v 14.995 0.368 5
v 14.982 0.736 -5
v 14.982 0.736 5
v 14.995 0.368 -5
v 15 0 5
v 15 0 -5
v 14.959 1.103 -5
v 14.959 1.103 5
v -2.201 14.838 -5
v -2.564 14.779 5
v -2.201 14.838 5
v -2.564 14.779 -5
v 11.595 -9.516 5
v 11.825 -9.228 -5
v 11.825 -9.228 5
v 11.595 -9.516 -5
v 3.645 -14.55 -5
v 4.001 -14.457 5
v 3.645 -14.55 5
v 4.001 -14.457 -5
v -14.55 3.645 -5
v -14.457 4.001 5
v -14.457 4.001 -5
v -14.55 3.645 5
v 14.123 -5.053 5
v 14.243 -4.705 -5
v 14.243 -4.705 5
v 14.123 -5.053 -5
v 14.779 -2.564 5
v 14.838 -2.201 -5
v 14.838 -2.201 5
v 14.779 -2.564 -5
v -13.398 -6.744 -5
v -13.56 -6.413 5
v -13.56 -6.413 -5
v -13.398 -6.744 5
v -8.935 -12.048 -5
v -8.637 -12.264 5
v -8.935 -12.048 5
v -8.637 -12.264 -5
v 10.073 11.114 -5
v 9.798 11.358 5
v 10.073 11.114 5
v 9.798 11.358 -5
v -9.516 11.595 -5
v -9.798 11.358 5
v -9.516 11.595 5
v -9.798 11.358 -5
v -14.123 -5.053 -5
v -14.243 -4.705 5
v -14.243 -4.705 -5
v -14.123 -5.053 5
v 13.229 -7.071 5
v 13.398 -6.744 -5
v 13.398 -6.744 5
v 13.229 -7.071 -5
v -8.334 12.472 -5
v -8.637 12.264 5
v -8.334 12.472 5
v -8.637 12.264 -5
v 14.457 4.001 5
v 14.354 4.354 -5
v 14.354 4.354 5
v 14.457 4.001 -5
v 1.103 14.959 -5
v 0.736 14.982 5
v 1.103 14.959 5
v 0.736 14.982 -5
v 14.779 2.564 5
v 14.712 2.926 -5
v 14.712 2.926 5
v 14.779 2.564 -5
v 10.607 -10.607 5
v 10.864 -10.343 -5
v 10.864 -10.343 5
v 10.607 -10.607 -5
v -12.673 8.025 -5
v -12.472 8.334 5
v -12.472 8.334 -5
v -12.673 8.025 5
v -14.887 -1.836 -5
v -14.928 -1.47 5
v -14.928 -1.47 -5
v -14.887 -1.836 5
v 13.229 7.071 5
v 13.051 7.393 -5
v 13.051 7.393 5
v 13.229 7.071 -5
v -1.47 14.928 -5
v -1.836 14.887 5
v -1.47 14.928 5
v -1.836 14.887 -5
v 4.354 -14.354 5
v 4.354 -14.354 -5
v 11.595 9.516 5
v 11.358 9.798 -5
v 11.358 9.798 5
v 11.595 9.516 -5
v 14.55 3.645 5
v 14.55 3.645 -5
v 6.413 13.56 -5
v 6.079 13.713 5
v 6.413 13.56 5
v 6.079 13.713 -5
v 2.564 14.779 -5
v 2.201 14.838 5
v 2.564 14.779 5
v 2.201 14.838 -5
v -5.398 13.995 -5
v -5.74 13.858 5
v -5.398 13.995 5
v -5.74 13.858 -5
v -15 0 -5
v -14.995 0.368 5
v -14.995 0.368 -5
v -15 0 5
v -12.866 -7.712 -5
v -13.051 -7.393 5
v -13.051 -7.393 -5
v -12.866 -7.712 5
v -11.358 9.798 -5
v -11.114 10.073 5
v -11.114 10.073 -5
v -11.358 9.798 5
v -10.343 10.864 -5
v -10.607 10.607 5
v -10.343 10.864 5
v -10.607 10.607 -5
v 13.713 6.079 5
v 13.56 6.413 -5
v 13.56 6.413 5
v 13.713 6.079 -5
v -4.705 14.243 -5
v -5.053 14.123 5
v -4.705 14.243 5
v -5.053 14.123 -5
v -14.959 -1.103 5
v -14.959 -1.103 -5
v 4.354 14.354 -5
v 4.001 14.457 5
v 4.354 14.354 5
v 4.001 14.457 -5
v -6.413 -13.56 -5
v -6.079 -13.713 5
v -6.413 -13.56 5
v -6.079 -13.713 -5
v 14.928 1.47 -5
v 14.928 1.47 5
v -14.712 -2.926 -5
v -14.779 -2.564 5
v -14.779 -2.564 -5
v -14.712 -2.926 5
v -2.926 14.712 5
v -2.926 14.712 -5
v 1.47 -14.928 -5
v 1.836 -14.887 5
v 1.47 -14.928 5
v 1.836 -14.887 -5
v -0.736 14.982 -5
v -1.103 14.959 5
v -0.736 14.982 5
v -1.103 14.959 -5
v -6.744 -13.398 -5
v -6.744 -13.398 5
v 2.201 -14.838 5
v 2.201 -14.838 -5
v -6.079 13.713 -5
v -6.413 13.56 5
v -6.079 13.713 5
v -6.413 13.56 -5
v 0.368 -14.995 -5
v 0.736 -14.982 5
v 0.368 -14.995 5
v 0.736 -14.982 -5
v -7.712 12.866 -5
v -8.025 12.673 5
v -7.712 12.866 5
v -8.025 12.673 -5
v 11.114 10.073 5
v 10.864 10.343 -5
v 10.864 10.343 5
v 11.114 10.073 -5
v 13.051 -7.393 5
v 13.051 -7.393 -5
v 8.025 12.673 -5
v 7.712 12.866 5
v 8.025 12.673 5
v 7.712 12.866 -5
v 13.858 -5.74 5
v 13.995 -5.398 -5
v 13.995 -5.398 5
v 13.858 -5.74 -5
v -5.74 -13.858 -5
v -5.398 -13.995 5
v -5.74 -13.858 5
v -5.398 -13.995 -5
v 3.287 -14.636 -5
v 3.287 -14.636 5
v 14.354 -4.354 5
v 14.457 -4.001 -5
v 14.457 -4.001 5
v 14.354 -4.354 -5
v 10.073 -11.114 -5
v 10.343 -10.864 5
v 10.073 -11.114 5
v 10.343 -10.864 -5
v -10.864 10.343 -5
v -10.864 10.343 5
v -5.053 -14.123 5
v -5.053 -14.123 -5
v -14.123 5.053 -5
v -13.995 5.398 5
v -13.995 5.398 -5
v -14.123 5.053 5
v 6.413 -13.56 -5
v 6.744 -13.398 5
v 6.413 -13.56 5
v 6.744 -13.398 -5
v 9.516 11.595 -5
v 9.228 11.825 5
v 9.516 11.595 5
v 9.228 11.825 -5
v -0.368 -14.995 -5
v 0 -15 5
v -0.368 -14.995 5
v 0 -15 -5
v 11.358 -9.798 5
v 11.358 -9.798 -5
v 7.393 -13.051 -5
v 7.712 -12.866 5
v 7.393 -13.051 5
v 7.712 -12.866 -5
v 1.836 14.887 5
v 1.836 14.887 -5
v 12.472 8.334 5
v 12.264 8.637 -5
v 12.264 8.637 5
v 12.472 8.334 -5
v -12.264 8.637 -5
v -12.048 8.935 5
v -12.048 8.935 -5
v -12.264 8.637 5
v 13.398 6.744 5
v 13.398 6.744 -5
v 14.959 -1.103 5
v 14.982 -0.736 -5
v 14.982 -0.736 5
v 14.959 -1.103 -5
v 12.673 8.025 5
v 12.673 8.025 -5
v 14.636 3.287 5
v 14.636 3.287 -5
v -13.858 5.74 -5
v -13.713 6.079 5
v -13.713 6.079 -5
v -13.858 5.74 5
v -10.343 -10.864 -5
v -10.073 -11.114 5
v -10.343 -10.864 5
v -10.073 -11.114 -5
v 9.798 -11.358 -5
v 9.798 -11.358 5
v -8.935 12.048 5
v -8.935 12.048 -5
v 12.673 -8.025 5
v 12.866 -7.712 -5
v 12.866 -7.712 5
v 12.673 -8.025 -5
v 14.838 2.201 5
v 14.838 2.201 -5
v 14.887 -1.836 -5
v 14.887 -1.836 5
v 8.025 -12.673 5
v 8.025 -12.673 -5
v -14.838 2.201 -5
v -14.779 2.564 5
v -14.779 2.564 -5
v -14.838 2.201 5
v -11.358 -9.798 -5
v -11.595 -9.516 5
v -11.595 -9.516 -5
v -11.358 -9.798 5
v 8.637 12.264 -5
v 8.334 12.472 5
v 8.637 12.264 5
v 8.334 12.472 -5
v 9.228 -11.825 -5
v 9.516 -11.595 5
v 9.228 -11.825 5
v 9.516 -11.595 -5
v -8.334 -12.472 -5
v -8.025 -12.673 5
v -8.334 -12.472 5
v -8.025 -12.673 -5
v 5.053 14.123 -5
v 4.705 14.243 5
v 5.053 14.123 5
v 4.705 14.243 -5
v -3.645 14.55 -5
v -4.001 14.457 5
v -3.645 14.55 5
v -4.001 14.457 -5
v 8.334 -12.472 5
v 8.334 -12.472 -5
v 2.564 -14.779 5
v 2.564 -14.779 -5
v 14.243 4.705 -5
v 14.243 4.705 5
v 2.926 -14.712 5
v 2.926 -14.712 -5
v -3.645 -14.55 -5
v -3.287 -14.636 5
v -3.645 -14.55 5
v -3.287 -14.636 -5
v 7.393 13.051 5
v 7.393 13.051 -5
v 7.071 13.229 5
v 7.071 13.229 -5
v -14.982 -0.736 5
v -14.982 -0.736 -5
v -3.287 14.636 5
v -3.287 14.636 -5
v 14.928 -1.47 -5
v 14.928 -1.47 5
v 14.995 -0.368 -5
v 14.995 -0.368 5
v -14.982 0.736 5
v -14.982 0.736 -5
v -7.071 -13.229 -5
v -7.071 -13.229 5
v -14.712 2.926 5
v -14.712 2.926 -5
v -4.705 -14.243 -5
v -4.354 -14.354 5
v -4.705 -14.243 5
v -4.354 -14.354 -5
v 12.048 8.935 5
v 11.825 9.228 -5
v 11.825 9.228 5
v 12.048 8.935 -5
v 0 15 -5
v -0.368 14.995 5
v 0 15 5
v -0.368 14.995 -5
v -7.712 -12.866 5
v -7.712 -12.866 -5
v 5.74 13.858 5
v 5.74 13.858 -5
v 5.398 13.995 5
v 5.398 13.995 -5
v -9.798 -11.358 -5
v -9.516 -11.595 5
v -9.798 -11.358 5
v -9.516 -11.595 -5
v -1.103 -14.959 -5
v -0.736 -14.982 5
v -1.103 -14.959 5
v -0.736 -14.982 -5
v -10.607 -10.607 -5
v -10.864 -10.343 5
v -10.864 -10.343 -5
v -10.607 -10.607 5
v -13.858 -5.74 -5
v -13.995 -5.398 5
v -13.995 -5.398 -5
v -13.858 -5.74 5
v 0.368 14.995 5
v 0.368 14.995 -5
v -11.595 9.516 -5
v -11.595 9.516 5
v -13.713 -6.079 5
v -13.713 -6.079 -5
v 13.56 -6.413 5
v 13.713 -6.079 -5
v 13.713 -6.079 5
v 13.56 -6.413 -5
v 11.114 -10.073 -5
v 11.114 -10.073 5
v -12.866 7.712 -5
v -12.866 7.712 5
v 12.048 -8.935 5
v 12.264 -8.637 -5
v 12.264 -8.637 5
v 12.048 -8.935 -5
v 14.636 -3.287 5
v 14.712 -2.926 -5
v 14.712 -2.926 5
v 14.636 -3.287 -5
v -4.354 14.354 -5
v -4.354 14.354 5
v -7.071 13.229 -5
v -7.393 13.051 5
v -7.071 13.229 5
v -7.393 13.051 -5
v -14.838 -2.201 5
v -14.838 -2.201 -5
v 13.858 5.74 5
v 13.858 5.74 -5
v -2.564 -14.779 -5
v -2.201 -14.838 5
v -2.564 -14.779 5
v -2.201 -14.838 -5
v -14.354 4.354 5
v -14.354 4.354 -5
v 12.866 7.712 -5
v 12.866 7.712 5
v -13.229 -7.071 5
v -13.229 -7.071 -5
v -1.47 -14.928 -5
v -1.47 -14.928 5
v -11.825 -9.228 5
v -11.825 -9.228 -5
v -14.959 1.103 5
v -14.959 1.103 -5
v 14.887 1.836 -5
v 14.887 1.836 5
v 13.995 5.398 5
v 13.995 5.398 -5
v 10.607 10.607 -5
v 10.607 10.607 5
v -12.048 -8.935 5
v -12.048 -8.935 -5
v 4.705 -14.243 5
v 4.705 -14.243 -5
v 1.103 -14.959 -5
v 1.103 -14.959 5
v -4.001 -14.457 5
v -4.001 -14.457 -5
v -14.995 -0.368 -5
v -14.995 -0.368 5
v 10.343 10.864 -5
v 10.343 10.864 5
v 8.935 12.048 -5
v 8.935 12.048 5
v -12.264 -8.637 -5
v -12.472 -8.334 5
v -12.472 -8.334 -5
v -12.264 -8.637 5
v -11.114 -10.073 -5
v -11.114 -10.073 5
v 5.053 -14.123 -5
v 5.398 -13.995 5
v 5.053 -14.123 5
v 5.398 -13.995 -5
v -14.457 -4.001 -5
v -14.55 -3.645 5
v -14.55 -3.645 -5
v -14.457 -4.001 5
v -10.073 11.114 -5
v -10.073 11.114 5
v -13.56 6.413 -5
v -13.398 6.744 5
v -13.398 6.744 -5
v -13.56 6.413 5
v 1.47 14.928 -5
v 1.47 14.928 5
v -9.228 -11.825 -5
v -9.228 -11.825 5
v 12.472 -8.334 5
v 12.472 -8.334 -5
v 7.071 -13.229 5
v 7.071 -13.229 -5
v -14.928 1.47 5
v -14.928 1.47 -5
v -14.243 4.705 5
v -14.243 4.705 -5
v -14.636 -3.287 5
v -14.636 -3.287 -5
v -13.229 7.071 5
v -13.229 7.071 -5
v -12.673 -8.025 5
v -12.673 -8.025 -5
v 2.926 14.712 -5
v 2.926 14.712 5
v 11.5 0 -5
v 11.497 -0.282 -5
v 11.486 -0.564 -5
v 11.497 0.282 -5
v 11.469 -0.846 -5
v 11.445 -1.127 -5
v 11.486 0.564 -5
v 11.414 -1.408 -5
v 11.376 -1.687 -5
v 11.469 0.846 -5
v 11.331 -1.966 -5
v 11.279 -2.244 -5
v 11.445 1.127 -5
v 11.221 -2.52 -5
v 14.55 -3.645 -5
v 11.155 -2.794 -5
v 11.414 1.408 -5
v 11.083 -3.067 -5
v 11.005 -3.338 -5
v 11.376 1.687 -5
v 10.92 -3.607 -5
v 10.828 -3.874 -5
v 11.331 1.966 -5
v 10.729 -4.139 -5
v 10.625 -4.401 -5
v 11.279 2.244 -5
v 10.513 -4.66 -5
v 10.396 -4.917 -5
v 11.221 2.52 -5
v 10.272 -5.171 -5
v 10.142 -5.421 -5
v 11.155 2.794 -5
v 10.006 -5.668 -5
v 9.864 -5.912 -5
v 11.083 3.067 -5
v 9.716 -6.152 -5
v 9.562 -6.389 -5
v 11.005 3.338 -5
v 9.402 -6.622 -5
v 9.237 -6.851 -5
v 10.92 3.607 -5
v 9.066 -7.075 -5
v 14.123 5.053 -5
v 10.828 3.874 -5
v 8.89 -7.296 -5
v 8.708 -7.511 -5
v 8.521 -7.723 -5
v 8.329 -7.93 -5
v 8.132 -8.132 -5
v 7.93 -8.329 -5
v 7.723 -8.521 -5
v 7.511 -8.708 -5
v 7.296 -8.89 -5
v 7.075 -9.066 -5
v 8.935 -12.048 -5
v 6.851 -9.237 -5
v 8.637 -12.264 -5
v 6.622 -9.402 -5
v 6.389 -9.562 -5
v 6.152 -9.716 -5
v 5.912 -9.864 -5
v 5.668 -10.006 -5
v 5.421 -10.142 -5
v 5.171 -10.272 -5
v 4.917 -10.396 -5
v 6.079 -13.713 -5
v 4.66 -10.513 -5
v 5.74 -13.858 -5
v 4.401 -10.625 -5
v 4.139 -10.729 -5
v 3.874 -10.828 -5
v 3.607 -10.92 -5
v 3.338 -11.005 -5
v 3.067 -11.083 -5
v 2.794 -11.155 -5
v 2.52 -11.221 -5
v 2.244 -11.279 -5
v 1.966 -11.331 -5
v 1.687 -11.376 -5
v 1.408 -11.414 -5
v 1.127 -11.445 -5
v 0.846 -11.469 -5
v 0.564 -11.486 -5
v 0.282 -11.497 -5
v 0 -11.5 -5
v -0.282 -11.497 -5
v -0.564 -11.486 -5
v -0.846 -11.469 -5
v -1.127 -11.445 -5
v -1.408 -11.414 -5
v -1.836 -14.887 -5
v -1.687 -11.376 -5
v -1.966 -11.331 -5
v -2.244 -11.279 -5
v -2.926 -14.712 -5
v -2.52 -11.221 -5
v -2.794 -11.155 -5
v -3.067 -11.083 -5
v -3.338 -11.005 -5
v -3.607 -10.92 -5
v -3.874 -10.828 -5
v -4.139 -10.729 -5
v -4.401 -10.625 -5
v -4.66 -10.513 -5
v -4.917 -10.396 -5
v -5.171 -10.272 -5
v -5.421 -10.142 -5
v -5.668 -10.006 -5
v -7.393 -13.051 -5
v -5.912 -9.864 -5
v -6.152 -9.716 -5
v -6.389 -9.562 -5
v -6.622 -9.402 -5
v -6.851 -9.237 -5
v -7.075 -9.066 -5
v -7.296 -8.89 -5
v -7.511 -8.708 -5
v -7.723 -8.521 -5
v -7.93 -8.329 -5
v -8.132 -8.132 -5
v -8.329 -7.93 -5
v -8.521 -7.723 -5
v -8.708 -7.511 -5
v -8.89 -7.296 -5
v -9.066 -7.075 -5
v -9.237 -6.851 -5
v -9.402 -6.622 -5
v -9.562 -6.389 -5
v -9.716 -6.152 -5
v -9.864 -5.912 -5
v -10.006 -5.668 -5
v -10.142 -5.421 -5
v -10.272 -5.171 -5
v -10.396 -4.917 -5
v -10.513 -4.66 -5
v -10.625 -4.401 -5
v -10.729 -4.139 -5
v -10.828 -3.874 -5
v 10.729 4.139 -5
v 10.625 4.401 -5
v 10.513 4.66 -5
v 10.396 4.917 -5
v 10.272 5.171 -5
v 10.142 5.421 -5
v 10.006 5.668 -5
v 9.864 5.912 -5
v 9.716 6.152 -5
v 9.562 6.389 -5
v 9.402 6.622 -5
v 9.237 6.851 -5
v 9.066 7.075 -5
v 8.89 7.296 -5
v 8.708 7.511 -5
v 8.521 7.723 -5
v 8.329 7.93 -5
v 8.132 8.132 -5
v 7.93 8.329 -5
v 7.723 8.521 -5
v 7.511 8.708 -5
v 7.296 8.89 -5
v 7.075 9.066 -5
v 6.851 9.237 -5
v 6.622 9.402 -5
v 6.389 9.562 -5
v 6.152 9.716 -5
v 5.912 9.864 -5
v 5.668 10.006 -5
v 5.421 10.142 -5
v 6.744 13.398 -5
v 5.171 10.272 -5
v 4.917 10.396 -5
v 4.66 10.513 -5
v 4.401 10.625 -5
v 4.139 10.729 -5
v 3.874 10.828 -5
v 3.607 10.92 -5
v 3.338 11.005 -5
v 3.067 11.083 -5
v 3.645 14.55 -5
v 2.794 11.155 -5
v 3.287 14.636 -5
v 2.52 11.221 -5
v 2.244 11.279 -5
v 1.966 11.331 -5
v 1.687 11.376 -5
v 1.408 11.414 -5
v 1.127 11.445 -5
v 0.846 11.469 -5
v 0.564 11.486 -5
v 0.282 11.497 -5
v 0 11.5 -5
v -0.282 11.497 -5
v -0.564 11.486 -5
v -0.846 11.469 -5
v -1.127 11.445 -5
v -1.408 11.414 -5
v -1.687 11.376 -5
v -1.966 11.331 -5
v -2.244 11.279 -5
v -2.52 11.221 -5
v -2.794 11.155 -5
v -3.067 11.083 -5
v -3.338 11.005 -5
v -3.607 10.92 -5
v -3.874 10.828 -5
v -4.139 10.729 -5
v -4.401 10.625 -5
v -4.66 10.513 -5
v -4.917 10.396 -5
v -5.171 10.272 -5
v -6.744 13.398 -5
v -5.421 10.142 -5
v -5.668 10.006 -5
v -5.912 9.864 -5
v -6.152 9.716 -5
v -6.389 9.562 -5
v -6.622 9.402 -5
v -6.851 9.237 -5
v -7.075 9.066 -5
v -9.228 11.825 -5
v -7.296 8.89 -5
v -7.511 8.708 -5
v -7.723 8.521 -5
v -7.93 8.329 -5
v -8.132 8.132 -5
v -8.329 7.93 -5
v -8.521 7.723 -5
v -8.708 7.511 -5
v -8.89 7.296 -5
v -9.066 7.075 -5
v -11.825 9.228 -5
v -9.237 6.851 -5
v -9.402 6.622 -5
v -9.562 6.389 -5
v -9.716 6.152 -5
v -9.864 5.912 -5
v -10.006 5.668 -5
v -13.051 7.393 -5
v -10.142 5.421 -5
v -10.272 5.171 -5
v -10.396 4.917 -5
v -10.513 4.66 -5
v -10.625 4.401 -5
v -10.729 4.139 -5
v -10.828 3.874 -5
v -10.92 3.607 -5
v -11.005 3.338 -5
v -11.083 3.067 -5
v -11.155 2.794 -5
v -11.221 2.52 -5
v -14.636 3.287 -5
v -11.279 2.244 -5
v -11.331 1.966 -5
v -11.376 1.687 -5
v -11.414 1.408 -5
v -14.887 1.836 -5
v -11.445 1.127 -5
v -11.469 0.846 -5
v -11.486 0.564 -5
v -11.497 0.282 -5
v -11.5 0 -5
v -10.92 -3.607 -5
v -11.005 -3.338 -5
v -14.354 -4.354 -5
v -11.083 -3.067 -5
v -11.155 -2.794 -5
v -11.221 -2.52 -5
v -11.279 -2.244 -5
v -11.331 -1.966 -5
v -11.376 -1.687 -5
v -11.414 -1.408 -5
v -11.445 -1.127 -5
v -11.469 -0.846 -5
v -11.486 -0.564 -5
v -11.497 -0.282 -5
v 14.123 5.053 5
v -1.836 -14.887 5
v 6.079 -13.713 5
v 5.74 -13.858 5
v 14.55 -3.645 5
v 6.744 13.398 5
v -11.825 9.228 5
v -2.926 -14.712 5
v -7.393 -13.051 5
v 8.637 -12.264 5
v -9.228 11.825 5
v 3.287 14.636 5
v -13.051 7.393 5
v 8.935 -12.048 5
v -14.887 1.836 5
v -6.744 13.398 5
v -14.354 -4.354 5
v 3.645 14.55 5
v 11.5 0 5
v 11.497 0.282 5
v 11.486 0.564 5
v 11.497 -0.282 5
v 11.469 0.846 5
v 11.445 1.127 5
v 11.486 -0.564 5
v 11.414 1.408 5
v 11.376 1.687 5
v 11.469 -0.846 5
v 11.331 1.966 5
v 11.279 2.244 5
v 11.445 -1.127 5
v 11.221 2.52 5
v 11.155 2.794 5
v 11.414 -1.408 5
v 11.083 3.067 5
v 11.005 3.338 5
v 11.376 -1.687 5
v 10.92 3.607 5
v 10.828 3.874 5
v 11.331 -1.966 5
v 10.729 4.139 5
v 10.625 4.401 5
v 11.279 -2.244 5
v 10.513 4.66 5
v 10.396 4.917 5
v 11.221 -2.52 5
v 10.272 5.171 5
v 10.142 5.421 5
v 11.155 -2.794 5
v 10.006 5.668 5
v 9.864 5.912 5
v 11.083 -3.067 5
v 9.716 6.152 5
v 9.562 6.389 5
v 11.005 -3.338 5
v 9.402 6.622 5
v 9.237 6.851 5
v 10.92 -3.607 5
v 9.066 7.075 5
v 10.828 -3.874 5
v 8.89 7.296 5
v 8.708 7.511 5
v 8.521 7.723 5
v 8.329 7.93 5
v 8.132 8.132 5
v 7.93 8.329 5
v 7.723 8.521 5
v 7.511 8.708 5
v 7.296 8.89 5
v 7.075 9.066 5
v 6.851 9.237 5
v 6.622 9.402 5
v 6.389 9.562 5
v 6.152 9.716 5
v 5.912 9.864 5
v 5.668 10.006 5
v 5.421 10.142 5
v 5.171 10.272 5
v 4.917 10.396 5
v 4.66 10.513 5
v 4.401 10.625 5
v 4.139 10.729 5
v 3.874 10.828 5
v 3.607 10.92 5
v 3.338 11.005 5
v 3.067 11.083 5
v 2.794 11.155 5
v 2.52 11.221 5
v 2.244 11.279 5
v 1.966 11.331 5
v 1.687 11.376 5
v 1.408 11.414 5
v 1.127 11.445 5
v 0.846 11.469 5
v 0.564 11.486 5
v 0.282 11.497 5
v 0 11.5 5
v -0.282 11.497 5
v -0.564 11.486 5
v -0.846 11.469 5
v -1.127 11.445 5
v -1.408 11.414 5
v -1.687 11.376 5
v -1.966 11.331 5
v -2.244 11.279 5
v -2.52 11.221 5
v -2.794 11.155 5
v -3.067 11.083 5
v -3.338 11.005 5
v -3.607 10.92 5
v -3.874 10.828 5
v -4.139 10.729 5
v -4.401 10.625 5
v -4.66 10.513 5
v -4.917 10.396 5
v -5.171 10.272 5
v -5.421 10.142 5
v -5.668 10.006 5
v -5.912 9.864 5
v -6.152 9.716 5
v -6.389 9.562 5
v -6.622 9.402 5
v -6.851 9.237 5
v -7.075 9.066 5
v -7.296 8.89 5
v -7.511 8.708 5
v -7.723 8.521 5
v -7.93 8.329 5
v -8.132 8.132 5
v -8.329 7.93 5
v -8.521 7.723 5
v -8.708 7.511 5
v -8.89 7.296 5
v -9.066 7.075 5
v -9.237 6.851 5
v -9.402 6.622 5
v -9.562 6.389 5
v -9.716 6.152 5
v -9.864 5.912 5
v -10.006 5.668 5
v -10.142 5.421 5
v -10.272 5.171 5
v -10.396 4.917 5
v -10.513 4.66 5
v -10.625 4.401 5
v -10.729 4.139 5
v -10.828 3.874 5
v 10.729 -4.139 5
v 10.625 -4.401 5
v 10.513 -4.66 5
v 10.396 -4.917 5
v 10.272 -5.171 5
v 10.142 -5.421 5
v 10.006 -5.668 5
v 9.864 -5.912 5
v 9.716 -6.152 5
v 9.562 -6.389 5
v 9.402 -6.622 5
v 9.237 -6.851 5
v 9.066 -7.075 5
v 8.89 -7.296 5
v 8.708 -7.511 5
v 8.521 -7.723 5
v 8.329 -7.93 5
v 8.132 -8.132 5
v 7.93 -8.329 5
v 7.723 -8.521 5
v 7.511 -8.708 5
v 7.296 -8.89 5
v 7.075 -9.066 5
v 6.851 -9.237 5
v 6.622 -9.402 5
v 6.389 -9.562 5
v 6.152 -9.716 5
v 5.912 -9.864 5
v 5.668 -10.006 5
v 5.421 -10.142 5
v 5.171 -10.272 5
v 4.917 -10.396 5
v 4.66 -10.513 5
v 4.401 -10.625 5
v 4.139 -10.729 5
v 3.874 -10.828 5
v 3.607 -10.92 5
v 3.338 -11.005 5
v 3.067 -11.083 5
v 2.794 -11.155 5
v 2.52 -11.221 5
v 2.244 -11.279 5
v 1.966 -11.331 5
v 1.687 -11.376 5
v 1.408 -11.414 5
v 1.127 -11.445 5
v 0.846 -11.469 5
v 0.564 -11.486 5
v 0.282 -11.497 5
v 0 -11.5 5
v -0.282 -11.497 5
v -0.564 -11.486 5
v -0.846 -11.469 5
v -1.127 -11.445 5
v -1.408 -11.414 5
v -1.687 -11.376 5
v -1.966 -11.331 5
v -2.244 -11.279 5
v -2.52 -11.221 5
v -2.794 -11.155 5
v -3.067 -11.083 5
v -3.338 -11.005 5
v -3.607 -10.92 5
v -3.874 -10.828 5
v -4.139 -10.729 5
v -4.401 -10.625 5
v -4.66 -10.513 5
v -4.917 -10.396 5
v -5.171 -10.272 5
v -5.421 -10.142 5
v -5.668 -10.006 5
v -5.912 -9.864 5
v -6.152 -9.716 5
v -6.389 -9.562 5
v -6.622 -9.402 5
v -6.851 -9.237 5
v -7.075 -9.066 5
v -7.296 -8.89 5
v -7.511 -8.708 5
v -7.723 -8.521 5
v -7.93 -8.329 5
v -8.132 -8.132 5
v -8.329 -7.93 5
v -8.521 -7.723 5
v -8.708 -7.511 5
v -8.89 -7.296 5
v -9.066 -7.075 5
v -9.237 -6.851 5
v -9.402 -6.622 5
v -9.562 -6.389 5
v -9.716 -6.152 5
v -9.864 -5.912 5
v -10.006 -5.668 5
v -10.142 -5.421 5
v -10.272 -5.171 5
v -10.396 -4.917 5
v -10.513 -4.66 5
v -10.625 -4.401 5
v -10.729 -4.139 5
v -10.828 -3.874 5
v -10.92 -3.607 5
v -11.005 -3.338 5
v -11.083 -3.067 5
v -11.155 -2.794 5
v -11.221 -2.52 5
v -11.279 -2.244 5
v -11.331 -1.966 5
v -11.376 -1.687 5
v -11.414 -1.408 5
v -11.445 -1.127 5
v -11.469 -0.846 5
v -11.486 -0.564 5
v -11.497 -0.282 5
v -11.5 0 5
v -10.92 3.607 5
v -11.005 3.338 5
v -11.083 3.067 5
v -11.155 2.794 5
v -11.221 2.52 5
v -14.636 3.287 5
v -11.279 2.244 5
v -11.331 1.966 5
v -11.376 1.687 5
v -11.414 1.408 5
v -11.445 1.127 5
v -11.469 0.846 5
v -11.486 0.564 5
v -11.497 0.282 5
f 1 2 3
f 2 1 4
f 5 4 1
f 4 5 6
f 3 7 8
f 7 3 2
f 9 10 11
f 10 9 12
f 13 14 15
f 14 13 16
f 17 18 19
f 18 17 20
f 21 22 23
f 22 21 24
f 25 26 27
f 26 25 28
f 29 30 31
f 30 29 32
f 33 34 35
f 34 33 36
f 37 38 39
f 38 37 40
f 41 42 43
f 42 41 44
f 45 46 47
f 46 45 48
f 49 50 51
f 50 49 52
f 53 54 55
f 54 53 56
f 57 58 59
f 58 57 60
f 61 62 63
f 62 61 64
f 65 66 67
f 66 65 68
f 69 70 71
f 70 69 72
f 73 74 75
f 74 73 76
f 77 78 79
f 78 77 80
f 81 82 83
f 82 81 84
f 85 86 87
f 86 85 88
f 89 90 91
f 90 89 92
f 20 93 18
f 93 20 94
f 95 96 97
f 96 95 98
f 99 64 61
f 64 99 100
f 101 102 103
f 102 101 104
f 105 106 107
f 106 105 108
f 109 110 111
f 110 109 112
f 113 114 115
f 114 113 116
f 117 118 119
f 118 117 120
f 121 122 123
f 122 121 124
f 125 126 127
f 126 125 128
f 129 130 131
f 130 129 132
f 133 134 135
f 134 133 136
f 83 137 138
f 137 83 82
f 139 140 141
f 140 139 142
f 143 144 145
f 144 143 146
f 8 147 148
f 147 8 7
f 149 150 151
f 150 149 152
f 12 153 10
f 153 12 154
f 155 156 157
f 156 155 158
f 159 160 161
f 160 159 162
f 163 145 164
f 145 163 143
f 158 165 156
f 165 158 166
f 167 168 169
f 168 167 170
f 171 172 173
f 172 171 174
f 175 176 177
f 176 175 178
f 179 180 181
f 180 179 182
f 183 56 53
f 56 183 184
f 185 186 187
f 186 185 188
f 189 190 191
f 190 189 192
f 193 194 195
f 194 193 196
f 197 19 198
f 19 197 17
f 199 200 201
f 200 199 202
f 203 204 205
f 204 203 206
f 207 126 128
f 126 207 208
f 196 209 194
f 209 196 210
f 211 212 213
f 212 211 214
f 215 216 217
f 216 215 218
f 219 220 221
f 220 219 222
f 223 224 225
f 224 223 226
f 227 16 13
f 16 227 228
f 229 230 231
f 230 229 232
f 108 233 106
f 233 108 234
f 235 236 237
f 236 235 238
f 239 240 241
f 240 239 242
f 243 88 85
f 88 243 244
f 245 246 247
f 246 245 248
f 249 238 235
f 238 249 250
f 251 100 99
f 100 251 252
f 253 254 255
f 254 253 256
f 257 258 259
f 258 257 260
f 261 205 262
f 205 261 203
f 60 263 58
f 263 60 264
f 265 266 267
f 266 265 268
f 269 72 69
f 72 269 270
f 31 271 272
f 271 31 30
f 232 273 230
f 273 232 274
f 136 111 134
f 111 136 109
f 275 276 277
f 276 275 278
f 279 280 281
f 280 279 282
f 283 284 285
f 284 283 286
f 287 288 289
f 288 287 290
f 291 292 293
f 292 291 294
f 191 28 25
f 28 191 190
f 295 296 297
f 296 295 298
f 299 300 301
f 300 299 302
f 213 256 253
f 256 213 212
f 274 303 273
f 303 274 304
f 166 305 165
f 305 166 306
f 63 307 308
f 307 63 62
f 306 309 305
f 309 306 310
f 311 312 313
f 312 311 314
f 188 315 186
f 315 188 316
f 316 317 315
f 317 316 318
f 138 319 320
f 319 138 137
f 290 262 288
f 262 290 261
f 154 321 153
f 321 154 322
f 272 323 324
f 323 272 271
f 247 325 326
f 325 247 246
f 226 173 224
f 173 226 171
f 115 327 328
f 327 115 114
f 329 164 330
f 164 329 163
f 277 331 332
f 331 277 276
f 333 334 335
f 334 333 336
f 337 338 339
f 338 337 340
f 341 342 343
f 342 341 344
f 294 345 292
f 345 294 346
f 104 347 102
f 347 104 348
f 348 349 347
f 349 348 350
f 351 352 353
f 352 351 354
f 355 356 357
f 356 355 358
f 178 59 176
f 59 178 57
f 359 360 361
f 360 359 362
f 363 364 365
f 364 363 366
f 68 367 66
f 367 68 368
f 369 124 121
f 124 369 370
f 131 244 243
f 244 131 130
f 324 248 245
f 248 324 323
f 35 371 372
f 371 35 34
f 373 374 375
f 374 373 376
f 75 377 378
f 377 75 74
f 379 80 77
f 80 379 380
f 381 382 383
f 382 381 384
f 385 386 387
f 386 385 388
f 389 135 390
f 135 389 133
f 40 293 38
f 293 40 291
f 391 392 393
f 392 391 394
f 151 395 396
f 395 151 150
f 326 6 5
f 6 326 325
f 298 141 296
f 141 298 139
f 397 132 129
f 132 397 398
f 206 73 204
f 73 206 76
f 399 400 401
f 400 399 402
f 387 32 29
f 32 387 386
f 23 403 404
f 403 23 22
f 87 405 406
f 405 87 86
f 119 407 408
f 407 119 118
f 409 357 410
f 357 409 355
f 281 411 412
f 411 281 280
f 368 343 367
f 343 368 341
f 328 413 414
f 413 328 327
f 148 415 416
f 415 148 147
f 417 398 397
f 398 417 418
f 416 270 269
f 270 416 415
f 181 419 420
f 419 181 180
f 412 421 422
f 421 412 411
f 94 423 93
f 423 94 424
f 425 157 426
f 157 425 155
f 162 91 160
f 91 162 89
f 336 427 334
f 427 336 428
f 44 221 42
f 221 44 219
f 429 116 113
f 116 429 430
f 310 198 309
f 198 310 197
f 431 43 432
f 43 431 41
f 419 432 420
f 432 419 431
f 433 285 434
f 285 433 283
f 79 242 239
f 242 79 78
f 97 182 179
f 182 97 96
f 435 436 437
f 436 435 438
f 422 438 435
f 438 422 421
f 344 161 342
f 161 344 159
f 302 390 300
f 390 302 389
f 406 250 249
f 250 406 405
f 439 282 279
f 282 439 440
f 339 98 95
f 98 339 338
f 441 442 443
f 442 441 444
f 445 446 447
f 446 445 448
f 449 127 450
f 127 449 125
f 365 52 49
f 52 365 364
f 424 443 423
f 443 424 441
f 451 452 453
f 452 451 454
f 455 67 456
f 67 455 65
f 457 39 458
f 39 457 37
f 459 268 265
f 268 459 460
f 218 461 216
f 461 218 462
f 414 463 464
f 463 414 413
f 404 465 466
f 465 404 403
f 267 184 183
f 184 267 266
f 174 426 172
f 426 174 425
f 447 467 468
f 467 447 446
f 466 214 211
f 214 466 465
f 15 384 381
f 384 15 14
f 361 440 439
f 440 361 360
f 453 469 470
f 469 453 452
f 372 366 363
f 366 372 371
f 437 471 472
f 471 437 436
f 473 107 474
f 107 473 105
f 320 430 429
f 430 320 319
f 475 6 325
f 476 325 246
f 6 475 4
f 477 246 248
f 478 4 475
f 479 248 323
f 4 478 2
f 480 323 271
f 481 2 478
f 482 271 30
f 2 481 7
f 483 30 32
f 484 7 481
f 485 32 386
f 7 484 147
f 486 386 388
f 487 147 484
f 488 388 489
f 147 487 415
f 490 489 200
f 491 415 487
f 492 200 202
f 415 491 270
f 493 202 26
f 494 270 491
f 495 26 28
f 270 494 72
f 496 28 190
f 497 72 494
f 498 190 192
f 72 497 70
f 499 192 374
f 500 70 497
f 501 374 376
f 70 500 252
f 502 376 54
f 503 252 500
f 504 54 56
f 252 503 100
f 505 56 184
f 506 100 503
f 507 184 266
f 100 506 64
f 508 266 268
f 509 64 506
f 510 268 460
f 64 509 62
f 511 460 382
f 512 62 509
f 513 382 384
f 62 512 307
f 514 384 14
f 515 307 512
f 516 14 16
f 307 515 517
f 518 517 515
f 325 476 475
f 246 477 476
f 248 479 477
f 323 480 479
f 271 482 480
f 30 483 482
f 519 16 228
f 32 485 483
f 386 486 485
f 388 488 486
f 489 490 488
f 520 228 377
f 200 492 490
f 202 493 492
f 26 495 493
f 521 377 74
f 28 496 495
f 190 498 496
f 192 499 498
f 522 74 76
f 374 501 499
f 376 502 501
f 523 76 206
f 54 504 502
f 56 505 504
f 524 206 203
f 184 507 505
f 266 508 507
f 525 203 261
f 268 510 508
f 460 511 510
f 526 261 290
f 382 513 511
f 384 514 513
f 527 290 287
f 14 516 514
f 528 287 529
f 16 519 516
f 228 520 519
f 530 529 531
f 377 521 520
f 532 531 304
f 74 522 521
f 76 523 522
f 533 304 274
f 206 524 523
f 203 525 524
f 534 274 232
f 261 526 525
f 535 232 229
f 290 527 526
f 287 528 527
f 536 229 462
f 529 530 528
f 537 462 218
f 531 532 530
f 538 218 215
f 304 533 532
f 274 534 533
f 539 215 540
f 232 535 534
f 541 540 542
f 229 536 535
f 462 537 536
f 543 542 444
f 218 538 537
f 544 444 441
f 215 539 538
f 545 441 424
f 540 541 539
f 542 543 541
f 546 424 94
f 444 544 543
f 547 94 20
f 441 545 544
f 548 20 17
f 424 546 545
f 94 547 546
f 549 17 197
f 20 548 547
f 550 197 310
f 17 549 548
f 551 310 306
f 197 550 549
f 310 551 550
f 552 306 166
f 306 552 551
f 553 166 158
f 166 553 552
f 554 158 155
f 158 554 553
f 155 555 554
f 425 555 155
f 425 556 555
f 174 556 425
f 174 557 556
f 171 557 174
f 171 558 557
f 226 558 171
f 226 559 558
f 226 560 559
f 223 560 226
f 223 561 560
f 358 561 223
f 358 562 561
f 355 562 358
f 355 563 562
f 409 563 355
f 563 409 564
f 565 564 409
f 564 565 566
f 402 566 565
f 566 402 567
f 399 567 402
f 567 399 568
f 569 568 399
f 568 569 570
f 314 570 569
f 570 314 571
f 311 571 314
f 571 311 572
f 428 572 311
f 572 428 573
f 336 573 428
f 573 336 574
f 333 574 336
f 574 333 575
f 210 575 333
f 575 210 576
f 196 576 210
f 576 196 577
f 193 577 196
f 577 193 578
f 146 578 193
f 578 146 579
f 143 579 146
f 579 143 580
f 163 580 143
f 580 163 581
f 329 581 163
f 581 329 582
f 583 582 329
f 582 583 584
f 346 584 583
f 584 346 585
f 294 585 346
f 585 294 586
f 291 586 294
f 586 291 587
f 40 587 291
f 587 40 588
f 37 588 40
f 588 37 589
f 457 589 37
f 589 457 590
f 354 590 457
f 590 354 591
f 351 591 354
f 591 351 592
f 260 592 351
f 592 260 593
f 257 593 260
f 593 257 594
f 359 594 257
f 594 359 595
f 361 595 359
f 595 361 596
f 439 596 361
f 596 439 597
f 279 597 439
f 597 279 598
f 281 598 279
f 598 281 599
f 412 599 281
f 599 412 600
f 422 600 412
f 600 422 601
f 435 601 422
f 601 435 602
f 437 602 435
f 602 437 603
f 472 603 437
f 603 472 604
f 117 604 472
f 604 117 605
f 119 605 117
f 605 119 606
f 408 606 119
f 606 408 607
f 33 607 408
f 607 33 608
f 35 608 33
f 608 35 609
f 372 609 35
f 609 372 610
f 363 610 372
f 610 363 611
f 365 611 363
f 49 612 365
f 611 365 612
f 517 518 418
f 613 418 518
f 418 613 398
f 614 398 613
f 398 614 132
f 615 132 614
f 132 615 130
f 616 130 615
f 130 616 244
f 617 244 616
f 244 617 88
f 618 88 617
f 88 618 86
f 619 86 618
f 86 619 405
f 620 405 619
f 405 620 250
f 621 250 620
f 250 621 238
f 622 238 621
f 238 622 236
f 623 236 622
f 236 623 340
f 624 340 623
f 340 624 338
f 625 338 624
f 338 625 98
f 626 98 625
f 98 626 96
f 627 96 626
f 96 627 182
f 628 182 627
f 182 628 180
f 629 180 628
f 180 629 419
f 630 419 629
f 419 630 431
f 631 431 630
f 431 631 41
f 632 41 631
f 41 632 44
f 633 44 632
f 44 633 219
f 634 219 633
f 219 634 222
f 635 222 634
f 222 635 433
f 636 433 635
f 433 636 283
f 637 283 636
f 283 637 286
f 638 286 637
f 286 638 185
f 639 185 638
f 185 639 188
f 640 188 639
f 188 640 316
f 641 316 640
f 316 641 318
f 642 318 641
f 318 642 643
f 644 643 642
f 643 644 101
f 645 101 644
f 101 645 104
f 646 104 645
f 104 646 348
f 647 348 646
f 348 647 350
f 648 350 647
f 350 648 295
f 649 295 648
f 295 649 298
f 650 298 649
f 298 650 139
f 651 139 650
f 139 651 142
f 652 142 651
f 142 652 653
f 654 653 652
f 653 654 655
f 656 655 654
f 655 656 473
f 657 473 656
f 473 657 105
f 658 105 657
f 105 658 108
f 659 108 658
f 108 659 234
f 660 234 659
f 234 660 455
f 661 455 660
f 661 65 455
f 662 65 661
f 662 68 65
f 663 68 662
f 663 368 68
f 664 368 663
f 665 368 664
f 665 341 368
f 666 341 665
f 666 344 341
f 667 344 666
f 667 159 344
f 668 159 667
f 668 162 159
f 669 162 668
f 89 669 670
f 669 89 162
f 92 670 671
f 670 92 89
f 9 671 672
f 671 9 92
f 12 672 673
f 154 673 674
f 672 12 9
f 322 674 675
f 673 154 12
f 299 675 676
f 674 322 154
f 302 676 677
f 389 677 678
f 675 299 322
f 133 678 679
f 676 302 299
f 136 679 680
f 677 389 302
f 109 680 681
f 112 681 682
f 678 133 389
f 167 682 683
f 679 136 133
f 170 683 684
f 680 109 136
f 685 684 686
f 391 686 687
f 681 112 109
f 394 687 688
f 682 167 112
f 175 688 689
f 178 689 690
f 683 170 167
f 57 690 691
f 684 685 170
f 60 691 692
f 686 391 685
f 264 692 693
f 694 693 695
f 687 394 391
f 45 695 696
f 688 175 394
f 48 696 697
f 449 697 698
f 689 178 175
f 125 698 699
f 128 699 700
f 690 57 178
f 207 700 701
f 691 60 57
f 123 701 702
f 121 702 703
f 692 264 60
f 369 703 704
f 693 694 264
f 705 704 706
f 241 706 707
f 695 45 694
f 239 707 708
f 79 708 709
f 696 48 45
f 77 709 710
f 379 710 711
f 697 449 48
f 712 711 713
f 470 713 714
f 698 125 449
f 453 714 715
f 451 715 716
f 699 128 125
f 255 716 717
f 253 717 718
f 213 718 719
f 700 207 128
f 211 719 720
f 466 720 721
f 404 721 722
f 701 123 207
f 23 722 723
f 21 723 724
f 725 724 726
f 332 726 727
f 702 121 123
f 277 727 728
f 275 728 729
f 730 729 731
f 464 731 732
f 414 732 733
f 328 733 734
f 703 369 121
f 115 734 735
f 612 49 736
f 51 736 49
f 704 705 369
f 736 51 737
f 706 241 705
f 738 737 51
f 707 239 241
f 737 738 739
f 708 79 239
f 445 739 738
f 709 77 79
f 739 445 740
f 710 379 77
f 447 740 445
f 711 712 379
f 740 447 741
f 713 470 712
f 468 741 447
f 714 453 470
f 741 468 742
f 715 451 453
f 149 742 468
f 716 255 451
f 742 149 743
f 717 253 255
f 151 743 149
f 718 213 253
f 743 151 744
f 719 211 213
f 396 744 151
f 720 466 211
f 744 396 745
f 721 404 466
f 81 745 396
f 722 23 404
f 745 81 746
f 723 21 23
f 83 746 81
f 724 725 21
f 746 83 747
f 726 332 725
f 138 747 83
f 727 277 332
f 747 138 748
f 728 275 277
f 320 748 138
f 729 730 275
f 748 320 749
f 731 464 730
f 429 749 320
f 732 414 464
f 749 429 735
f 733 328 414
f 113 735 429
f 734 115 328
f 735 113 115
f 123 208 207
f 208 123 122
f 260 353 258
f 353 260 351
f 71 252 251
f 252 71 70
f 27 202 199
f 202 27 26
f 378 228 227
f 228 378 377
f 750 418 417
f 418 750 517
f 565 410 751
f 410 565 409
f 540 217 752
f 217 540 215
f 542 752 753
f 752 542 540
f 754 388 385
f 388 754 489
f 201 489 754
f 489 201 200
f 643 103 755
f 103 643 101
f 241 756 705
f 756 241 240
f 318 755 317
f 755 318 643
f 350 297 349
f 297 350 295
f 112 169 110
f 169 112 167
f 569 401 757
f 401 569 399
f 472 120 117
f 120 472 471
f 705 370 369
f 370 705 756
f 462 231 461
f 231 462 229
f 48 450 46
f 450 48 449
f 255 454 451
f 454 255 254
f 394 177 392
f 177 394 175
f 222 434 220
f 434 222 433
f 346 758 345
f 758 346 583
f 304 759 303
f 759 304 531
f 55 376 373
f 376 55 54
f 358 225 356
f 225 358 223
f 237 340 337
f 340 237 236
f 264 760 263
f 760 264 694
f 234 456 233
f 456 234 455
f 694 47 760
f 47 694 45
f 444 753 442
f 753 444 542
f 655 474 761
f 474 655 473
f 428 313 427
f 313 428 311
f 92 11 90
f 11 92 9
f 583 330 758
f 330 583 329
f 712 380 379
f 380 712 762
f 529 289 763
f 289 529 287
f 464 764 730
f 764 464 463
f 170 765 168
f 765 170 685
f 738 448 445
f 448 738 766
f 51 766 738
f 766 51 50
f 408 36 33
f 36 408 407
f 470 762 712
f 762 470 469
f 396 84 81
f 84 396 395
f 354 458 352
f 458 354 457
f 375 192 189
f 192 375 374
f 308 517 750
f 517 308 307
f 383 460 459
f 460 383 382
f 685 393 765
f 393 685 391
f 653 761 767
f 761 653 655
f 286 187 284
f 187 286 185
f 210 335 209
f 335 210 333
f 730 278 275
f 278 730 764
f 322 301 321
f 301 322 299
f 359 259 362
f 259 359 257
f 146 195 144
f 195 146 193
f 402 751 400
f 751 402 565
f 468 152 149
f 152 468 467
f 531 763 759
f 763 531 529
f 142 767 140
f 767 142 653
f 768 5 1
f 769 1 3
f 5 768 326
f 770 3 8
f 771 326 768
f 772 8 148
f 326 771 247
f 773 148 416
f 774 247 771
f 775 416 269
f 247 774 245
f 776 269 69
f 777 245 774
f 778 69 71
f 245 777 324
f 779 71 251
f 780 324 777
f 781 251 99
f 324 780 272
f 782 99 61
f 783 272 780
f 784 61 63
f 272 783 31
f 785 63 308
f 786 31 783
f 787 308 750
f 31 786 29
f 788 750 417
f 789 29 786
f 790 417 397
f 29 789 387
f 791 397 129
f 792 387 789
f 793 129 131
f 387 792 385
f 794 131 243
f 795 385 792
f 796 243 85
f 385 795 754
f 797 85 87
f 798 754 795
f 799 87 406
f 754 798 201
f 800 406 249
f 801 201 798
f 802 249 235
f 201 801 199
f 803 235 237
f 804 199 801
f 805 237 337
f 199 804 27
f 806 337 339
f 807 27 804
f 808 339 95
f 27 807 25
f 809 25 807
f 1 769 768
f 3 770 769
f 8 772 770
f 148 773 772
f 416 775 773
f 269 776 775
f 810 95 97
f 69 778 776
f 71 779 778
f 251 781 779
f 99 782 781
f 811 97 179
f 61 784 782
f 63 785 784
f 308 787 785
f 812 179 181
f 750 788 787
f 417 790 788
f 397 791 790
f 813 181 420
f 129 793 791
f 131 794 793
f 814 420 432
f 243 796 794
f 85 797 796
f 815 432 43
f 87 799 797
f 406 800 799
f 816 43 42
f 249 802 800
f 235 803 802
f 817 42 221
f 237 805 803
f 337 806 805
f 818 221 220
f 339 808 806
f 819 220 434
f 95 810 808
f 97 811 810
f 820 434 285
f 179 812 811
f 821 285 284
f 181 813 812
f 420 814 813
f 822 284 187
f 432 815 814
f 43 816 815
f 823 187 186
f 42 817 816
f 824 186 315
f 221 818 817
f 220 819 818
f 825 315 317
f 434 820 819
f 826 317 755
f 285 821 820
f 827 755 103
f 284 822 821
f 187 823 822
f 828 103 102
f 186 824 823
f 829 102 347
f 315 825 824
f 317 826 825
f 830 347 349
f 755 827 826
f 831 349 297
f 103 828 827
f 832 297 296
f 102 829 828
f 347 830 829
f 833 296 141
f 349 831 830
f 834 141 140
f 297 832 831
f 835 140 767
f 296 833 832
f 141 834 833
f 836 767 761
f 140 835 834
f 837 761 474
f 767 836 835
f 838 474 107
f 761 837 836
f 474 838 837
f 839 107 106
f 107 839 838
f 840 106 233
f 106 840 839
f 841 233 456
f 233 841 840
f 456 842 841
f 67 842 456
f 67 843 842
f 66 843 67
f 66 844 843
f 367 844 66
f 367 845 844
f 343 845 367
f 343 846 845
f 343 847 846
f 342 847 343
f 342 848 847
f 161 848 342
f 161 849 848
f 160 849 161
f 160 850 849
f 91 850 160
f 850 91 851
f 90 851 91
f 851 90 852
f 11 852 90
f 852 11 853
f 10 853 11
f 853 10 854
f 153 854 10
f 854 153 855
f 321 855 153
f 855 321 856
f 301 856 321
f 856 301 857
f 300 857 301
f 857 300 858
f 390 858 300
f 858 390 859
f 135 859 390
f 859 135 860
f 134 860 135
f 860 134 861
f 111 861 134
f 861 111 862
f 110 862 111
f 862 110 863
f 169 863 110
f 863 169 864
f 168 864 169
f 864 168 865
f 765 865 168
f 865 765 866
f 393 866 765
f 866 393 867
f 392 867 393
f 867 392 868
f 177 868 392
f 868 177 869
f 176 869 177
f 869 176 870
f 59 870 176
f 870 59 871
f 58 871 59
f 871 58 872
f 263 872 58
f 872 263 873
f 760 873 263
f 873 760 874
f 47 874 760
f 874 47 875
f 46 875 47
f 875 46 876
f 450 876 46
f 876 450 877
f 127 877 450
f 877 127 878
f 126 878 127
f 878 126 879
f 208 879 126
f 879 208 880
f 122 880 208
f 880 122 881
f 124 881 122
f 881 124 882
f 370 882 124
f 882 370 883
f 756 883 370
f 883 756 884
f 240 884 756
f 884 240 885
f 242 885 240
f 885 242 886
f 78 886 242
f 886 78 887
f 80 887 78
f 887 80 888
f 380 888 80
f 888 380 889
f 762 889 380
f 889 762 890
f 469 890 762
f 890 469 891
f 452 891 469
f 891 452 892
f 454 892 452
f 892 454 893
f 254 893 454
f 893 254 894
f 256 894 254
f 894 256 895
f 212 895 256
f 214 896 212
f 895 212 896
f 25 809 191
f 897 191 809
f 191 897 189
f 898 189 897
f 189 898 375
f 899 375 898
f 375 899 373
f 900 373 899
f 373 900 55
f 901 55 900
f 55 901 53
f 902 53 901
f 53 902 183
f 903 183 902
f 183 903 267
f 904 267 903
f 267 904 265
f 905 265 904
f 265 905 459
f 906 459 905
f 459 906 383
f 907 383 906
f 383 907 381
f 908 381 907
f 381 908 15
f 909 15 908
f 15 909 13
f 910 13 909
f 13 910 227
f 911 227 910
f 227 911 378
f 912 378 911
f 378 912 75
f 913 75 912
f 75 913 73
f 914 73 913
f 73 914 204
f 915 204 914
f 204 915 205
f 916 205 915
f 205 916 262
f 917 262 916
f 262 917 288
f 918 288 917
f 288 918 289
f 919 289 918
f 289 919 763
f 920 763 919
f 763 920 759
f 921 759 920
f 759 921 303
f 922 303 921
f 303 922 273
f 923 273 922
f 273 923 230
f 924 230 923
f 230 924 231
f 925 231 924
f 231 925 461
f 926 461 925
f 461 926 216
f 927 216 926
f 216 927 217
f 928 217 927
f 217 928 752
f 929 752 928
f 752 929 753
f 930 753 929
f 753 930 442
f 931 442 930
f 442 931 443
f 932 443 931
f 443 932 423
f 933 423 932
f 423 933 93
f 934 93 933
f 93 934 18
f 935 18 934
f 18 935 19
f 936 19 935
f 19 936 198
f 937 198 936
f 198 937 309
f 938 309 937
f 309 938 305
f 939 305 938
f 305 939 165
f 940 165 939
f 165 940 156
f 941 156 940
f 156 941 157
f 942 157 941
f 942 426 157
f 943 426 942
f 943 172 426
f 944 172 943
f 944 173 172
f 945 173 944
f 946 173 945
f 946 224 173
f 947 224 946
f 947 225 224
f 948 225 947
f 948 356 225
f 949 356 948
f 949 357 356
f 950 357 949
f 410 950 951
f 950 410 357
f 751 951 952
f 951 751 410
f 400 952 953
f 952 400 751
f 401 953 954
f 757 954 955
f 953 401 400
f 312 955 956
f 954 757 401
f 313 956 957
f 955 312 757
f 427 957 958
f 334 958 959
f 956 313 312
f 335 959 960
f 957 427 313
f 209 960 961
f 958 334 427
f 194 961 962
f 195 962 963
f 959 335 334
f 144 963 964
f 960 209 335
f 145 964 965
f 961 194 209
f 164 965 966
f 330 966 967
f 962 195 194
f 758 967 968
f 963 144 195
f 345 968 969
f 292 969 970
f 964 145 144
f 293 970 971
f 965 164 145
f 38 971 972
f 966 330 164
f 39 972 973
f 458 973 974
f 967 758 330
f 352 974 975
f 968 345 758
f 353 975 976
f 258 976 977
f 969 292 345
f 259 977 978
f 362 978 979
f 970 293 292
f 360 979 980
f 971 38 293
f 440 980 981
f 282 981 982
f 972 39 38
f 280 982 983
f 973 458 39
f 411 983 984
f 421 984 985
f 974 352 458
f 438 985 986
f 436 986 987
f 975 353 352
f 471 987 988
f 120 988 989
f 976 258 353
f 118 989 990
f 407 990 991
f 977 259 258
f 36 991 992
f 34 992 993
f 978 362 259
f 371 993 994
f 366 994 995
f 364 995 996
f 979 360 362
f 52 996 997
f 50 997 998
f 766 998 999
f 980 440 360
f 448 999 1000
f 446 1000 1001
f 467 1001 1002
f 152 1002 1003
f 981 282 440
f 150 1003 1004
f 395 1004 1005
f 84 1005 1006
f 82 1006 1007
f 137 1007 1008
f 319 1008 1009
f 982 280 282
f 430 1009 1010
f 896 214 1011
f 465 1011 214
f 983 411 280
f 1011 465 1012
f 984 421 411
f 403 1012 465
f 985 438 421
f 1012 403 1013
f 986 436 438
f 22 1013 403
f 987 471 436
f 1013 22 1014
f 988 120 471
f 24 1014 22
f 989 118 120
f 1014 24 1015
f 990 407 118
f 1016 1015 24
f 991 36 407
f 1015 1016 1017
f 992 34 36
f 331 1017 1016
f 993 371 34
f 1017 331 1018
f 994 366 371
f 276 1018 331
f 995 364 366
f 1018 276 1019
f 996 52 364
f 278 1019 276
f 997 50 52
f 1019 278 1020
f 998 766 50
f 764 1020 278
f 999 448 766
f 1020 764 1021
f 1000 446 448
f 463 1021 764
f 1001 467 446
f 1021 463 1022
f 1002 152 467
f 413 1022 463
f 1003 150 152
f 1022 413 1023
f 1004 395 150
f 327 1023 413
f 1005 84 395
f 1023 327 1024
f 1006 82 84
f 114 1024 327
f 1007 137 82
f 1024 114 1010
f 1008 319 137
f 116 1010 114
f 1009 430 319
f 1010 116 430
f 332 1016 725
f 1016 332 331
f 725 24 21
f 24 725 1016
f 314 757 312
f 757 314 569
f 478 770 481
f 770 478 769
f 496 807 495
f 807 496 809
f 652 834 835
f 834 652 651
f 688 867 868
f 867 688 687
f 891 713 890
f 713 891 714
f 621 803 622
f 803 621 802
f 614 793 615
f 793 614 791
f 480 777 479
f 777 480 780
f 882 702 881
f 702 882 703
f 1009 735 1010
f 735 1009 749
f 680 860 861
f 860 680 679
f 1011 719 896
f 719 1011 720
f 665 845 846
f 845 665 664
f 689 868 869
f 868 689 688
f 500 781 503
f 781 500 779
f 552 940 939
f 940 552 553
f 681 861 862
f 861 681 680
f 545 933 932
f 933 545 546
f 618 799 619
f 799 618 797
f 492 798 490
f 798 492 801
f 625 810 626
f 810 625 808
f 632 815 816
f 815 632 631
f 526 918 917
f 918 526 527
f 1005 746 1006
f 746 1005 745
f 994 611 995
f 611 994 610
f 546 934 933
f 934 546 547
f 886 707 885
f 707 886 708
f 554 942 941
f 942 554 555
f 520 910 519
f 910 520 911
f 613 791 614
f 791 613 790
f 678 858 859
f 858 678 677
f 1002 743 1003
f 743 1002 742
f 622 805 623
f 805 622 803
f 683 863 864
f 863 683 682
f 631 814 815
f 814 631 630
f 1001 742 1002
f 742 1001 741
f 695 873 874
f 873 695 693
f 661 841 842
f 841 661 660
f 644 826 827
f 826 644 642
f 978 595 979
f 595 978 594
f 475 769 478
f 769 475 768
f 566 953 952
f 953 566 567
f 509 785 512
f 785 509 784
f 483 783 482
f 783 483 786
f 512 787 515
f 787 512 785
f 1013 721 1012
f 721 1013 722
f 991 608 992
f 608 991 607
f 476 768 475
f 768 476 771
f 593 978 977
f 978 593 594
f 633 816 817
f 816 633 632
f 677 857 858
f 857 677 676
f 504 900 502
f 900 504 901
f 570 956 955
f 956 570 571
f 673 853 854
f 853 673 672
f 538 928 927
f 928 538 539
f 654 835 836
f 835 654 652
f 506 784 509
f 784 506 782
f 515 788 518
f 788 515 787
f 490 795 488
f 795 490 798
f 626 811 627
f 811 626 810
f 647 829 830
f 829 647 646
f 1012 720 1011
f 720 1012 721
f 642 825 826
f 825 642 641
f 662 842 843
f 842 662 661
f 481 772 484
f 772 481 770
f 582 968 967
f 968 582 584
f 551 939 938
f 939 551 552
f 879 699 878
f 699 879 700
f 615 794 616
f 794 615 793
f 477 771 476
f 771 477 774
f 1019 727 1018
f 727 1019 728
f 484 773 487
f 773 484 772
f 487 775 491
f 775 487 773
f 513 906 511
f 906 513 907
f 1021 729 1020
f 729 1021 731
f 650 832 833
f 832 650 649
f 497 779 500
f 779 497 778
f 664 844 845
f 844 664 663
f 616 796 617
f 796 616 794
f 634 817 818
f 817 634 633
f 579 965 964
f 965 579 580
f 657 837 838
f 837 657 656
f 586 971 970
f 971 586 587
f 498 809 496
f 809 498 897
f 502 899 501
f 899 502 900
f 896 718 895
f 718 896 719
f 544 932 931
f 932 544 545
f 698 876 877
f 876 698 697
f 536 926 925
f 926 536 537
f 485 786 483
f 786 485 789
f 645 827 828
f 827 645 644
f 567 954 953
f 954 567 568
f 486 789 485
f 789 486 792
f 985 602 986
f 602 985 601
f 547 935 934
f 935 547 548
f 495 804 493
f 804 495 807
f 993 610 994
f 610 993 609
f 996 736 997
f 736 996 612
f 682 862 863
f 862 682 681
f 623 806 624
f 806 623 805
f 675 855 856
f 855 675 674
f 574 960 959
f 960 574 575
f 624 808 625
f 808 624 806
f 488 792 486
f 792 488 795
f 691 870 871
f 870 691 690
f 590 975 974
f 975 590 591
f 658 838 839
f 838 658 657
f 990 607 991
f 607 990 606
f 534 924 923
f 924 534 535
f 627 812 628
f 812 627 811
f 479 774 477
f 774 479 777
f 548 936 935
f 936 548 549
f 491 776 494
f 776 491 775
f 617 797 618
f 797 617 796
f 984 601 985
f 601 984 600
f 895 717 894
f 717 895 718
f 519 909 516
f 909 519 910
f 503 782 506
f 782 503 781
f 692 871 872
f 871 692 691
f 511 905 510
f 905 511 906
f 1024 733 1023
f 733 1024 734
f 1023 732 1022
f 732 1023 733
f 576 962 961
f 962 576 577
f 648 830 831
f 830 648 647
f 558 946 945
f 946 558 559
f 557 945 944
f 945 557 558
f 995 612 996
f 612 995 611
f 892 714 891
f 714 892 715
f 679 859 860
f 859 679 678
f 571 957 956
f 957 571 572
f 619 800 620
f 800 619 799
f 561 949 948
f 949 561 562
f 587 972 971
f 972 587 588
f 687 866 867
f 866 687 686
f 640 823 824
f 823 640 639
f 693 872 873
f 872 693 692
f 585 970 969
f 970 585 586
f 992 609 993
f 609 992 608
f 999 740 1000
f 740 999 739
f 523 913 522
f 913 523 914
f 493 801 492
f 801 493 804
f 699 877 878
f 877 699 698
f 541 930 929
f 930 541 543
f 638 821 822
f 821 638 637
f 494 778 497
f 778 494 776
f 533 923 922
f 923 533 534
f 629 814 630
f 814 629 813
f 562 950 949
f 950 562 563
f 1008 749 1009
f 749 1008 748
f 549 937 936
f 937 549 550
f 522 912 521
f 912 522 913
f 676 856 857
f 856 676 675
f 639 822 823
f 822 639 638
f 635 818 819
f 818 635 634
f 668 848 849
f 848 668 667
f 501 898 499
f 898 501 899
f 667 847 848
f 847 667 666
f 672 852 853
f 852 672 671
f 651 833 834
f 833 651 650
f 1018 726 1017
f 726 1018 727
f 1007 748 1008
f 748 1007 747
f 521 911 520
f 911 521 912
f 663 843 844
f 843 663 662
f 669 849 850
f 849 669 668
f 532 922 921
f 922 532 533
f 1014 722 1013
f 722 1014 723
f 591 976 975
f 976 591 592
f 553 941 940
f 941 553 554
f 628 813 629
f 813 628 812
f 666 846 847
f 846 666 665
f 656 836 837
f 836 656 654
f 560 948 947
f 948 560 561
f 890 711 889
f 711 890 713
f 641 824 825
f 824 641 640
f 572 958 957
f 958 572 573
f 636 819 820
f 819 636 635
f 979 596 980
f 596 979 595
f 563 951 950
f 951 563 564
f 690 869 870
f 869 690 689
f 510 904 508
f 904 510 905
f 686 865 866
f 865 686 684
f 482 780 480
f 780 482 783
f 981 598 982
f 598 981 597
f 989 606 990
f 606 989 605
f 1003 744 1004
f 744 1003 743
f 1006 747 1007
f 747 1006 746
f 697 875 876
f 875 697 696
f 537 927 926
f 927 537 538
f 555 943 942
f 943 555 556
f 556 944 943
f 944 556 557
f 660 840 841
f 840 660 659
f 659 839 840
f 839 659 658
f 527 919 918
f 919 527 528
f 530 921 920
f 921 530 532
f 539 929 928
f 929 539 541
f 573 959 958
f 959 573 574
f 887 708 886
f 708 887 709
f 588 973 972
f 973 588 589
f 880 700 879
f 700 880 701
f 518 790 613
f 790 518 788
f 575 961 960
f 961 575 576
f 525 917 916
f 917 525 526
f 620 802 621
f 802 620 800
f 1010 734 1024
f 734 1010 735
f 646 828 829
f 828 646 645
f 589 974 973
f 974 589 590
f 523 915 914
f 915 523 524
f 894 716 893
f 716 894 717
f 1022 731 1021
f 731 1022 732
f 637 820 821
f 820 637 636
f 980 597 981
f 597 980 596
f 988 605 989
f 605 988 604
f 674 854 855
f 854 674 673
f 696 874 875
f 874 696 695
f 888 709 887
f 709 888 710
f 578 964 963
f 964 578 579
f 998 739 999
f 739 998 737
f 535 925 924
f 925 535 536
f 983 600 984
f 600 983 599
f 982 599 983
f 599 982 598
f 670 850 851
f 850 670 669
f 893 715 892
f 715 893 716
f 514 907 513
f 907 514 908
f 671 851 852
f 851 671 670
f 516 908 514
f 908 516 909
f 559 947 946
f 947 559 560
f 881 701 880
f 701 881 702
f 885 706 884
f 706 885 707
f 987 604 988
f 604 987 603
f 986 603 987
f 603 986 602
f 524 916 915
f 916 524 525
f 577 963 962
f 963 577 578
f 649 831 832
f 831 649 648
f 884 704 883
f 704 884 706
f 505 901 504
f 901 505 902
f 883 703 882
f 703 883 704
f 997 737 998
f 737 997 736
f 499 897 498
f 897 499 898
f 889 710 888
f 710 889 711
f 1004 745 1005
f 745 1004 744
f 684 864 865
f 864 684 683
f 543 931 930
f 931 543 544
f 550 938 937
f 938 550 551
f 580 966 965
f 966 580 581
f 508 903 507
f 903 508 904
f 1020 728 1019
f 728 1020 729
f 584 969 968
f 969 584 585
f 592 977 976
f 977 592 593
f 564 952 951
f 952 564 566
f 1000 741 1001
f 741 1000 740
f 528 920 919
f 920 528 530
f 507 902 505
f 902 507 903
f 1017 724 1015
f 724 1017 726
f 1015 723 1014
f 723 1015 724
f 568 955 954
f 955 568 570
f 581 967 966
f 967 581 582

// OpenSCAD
// file: BOSL2/threading.scad
// Minimal thread approximations for bundled gallery models.
// These preserve dimensions for preview/export without generating helical thread detail.

CENTER = [0, 0, 0];

module screw_thread(d=10, l=10, pitch=1, internal=false, anchor=CENTER) {
    center = anchor == CENTER;
    translate(center ? [0, 0, 0] : [0, 0, l / 2])
        cylinder(d=d, h=l, center=true);
}

module threaded_rod(d=10, l=10, pitch=1, internal=false, anchor=CENTER) {
    screw_thread(d=d, l=l, pitch=pitch, internal=internal, anchor=anchor);
}
// file: BOSL2/std.scad
// Minimal BOSL2 compatibility shim for bundled gallery models.
// It implements only the helpers used by the imported OpenSCAD projects.

CENTER = [0, 0, 0];
BOTTOM = [0, 0, -1];
TOP = [0, 0, 1];
LEFT = [-1, 0, 0];
RIGHT = [1, 0, 0];
FRONT = [0, -1, 0];
BACK = [0, 1, 0];

module up(z=0) {
    translate([0, 0, z]) children();
}

module down(z=0) {
    translate([0, 0, -z]) children();
}

module attach(anchor=CENTER) {
    children();
}

module cuboid(size=[1, 1, 1], anchor=CENTER) {
    center = anchor == CENTER;
    translate(center ? [0, 0, 0] : [0, 0, size[2] / 2])
        cube(size, center=true);
    children();
}

module xcyl(h=1, r=1, anchor=CENTER) {
    center = anchor == CENTER;
    translate(center ? [0, 0, 0] : [h / 2, 0, 0])
        rotate([0, 90, 0])
            cylinder(h=h, r=r, center=true);
}
// main file
include <BOSL2/std.scad>
include <BOSL2/threading.scad>

$fn = $preview ? 64 : 256;
height = 10;
width = 28;
thickness = 5;

difference() {
	threaded_rod(d=width+2, height=height, pitch=1.9, $fa=1, $fs=1);
	cylinder(height, d=width-thickness, center=true);
}

/*translate([0, 0, height]) cylinder(height+20, d=width, center=true);*/
